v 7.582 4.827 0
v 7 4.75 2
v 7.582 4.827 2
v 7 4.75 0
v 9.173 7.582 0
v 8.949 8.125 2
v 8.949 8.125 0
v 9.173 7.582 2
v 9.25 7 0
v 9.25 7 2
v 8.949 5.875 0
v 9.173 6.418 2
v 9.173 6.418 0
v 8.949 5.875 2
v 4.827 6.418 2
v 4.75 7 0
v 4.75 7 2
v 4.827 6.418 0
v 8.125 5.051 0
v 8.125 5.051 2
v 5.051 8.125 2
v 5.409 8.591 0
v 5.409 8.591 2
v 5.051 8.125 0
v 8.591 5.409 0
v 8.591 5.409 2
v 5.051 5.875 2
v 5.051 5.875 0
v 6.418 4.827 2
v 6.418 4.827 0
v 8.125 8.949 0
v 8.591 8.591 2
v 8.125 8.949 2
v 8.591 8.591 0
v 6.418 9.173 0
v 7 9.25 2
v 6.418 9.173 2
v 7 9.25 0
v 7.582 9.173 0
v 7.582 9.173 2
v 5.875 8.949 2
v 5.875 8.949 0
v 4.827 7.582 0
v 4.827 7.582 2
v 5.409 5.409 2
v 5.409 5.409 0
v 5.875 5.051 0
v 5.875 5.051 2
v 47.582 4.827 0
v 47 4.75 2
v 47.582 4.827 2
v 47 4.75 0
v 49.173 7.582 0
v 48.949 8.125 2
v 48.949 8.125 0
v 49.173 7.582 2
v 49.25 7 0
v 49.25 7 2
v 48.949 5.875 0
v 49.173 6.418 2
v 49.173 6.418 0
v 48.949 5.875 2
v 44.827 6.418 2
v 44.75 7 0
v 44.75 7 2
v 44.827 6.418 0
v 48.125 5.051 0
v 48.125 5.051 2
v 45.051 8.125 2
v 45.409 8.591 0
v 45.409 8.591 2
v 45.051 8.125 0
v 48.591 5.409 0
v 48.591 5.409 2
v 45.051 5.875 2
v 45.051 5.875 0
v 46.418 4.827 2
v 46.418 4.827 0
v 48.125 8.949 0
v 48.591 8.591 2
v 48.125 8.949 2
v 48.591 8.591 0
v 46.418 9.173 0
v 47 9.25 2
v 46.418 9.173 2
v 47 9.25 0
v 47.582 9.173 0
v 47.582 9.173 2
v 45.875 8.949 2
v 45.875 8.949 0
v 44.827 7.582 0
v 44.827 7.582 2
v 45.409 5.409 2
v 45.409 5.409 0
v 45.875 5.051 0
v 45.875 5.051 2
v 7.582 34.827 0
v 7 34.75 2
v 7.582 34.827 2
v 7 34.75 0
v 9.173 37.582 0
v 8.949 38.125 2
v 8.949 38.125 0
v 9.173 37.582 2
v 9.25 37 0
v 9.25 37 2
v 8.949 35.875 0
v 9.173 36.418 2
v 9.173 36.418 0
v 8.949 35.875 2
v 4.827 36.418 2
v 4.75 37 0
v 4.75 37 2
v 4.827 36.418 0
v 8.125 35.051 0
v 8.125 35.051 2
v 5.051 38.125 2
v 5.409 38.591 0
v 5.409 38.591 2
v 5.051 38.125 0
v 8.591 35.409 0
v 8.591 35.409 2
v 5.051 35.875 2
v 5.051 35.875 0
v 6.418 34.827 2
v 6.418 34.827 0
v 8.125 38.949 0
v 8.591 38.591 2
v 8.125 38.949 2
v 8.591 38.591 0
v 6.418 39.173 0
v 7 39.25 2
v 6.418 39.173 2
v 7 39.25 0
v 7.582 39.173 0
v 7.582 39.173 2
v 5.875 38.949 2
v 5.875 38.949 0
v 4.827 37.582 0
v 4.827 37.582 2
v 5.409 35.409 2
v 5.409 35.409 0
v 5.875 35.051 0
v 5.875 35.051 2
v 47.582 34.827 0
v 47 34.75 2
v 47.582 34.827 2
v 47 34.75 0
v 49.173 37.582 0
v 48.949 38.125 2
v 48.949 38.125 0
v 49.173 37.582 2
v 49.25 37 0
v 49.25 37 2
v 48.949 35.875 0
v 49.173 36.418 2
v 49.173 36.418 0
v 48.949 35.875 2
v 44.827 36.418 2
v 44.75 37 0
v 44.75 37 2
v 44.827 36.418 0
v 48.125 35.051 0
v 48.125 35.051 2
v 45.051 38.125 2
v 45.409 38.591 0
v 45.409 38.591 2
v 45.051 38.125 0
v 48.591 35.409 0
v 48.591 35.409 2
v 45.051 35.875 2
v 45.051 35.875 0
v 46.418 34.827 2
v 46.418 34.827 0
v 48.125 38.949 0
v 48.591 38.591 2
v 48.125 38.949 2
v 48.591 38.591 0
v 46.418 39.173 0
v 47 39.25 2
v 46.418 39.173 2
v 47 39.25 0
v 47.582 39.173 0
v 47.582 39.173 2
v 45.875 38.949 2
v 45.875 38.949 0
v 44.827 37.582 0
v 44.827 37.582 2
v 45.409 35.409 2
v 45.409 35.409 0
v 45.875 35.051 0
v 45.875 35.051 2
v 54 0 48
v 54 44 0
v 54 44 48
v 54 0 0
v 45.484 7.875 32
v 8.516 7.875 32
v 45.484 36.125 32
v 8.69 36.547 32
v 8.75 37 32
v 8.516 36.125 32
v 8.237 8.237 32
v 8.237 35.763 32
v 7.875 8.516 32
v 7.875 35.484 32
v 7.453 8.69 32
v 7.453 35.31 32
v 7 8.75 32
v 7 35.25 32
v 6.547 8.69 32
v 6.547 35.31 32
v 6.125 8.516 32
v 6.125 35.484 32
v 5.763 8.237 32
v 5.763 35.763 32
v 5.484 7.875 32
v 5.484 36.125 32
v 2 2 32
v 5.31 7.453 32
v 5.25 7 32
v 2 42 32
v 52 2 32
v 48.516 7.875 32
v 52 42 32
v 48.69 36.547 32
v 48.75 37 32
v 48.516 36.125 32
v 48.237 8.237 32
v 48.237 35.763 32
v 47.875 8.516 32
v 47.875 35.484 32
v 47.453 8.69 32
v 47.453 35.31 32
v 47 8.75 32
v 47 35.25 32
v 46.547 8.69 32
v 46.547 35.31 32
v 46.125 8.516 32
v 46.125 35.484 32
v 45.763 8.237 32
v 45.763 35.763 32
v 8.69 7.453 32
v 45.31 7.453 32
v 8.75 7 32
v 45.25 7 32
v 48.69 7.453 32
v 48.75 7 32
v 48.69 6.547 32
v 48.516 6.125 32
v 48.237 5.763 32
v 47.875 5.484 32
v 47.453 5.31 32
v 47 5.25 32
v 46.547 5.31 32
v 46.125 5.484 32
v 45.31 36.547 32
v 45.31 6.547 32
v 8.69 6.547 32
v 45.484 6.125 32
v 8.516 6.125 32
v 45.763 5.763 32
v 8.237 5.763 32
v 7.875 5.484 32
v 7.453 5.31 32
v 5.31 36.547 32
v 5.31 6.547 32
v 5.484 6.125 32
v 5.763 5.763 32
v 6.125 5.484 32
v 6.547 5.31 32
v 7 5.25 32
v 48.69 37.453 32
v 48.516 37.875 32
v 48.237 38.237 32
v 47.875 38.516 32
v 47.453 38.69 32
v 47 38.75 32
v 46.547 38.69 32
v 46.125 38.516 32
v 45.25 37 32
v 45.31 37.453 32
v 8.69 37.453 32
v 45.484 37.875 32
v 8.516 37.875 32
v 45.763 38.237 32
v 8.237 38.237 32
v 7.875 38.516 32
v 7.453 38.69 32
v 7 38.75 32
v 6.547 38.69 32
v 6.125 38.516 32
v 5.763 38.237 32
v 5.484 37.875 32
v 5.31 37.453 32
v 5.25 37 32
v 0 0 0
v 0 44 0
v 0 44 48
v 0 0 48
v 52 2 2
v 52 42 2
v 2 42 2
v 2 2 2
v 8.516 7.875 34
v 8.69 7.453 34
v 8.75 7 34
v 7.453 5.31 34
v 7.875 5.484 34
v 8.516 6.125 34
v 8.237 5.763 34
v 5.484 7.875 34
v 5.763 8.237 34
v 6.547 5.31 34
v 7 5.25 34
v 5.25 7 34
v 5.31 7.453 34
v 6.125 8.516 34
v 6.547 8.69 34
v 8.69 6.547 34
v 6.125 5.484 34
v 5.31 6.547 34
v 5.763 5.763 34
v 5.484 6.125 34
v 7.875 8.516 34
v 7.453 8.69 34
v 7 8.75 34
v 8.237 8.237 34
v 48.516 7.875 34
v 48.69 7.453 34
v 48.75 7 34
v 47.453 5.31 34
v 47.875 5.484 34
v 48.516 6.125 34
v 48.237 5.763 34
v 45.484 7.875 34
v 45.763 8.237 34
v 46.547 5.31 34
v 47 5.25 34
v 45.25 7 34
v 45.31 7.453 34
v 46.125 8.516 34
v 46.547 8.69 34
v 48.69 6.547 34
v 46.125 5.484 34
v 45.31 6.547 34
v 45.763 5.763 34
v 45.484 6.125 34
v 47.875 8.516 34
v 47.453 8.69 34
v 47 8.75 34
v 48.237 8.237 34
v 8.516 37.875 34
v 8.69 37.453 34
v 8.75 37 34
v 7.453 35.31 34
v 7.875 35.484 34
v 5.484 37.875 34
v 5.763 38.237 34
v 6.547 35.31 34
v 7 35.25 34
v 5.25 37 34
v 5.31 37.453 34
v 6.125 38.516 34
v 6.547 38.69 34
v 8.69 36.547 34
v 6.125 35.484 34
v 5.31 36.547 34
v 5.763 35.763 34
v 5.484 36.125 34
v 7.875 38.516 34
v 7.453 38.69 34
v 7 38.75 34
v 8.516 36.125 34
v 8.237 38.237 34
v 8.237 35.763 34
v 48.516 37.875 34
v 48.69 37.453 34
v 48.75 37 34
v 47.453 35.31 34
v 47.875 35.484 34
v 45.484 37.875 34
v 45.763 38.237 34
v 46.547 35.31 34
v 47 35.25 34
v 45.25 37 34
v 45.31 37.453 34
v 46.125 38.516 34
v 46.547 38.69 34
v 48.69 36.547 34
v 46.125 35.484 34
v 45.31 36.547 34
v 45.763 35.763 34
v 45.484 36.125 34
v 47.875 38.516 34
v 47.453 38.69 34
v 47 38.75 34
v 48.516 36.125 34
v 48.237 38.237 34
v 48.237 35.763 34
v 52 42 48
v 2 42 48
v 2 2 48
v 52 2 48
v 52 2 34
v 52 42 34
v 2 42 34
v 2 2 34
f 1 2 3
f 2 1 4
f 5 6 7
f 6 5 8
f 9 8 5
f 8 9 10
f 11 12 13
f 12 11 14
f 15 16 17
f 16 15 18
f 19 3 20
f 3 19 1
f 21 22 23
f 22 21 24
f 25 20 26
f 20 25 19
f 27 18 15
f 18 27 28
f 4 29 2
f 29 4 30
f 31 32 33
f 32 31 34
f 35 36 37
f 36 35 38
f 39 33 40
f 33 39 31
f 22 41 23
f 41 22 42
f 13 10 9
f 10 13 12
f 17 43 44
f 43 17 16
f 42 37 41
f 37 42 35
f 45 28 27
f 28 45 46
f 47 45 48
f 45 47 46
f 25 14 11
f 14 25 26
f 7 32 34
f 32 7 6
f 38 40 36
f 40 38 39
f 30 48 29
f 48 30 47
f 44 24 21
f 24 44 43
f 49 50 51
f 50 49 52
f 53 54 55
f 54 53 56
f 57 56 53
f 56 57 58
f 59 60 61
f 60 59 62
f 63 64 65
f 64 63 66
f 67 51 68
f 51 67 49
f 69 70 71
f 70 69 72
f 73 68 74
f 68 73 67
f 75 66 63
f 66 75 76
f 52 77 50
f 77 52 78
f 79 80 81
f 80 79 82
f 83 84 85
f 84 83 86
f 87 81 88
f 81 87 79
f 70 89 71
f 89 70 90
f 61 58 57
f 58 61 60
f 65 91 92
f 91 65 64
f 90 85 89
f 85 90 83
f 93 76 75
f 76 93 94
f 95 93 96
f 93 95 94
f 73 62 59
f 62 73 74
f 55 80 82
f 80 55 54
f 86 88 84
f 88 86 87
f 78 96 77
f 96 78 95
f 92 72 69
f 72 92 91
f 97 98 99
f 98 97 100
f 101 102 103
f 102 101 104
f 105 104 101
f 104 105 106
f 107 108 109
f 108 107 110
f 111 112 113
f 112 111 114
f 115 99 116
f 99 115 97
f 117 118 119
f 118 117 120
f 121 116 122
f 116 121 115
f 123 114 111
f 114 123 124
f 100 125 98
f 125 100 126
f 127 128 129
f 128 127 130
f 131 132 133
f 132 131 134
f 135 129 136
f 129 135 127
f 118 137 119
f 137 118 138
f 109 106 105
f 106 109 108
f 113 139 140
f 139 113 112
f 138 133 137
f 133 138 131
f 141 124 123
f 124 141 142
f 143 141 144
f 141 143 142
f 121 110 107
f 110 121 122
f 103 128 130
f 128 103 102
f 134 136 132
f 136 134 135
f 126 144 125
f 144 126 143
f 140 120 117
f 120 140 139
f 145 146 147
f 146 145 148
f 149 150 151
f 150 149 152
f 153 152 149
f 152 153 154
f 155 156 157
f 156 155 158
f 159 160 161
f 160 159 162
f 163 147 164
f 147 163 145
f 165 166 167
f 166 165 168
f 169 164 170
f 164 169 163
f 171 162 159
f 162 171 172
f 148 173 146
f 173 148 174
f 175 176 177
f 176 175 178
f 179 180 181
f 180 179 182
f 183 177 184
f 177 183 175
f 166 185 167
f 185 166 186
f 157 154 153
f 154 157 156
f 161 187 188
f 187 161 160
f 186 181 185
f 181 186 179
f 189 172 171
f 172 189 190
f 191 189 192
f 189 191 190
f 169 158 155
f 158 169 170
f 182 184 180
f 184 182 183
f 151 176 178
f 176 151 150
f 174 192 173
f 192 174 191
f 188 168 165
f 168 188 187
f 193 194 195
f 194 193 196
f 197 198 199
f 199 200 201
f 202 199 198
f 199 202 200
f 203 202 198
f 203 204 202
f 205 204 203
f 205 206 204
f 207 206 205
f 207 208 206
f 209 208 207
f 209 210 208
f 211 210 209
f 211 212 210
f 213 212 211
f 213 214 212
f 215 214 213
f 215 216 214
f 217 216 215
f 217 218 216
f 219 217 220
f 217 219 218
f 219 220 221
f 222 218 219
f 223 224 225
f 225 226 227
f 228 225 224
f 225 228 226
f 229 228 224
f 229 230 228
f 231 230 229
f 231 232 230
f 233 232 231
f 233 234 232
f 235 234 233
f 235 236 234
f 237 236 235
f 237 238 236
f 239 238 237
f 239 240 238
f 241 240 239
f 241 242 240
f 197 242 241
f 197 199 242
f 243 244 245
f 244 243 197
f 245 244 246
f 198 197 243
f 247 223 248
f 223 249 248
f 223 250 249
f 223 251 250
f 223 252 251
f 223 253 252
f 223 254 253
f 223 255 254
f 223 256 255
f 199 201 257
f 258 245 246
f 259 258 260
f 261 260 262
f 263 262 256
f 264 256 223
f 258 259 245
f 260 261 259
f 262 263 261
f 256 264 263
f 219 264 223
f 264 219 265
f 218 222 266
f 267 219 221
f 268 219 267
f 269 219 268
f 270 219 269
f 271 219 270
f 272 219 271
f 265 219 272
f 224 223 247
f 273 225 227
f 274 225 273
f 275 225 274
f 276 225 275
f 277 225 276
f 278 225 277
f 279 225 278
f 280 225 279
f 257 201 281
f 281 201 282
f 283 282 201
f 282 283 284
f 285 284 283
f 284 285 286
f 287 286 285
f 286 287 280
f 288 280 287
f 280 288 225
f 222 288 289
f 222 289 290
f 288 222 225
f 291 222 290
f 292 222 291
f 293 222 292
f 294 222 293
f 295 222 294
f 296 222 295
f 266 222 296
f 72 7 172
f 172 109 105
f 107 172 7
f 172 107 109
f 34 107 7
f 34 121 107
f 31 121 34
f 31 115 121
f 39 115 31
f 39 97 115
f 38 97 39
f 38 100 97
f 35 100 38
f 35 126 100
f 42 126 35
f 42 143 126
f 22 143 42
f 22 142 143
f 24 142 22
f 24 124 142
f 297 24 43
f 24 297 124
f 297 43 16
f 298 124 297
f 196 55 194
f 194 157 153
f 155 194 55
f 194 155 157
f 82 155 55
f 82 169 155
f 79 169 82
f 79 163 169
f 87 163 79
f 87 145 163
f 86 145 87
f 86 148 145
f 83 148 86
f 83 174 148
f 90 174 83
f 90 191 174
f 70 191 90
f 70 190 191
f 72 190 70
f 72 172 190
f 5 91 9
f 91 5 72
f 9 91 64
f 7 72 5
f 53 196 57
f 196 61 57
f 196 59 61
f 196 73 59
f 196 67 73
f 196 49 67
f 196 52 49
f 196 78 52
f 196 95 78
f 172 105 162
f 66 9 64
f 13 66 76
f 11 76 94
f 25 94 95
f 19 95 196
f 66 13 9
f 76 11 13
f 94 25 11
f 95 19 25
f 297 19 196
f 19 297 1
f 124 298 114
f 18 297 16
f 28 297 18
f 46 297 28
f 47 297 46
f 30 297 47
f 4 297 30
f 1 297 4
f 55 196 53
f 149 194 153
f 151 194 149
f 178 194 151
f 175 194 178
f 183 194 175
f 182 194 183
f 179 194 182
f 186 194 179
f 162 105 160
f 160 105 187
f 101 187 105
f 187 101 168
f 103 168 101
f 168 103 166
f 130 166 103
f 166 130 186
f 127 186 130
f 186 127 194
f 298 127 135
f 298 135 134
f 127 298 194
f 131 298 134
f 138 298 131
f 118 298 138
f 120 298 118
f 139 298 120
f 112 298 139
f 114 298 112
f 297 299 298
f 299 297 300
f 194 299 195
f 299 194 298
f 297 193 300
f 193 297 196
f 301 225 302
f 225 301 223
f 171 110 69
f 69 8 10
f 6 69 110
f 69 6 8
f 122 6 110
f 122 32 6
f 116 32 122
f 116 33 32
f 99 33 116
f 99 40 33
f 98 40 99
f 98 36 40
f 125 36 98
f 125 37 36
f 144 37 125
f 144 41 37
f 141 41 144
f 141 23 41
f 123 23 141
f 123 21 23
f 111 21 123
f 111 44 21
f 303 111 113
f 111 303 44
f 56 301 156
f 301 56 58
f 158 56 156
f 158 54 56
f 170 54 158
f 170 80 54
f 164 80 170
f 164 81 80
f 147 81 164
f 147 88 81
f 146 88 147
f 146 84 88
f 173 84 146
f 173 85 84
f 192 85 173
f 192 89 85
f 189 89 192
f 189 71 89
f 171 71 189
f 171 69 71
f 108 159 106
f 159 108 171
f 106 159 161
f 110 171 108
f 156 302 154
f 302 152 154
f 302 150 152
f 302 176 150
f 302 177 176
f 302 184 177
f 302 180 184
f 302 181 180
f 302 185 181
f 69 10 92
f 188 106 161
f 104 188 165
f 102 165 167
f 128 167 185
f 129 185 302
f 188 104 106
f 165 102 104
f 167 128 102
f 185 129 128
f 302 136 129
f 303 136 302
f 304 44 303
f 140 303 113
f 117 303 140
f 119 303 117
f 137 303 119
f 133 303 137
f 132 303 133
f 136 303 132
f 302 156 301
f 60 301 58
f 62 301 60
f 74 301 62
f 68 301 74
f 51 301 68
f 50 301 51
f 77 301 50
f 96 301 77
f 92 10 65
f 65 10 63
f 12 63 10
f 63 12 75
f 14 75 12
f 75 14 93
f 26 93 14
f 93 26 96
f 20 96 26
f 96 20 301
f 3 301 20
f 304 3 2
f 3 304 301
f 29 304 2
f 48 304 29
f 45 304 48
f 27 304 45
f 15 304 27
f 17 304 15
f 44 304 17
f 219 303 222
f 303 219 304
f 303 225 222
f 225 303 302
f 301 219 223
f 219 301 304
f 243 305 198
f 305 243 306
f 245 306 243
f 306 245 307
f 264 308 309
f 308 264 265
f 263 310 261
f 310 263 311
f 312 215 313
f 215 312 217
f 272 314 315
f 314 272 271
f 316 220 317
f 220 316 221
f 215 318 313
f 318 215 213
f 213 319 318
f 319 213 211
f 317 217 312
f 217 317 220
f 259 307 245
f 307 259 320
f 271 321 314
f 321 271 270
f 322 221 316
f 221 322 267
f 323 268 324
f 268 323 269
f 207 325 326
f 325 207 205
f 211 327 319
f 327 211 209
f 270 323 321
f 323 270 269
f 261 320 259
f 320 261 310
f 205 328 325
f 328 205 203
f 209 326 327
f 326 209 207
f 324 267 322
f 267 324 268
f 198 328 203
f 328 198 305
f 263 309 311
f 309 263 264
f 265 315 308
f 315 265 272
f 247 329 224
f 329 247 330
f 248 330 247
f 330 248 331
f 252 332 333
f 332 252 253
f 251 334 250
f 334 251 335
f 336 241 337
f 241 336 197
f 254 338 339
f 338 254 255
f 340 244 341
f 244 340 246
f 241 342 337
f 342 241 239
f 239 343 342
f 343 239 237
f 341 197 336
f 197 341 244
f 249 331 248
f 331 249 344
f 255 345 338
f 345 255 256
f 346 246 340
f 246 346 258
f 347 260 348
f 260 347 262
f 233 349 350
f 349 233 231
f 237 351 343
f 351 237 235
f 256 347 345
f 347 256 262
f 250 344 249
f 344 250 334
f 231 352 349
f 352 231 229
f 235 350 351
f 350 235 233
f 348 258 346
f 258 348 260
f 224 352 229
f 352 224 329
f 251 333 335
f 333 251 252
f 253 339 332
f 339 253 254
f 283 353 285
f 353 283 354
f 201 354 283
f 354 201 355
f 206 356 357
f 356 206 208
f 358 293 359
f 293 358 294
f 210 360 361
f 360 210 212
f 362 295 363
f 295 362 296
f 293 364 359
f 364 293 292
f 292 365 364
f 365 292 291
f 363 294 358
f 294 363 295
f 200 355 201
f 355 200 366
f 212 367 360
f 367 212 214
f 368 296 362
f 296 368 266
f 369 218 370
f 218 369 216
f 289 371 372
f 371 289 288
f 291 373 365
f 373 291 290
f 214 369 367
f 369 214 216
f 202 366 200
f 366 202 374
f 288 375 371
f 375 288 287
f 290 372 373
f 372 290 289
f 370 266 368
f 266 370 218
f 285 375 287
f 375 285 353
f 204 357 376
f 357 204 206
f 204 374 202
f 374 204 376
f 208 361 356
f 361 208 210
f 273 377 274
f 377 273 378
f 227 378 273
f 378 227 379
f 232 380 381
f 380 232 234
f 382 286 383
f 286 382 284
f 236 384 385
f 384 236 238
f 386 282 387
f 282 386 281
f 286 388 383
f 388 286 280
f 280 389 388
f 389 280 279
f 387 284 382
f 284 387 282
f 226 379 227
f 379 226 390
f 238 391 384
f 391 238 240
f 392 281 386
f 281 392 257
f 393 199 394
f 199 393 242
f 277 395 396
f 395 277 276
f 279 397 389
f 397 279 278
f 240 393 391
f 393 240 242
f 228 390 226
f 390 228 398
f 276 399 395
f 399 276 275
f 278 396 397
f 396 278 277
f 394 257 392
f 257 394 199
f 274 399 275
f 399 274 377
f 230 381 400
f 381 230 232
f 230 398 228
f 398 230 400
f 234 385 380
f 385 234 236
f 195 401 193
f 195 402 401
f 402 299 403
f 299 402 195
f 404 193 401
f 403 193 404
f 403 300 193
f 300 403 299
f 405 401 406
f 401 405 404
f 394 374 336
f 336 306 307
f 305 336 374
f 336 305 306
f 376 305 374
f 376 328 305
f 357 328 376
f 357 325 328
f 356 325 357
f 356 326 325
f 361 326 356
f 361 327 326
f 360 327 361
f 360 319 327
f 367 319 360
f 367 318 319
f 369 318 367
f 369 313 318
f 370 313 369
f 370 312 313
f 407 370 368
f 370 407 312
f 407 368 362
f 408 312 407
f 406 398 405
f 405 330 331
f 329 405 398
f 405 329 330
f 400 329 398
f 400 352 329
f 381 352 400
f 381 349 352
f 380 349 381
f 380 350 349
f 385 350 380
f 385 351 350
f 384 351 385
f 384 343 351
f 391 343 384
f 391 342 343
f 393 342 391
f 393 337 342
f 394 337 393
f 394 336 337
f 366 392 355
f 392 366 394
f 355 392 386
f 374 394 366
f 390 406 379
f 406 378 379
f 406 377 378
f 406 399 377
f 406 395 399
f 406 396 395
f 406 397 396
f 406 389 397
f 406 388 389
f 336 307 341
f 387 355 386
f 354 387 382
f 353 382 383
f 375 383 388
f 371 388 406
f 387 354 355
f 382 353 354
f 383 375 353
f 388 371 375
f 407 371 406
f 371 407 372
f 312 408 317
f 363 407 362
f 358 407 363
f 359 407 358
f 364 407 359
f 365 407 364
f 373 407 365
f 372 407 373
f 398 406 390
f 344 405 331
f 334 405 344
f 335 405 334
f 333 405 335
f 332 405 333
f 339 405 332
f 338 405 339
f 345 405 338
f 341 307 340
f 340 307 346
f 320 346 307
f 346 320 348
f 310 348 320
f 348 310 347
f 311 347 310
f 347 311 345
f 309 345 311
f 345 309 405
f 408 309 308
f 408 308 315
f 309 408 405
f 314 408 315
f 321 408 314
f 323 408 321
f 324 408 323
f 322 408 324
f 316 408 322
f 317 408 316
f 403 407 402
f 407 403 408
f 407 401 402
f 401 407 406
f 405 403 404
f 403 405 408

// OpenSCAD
// 3D-Printable Two-Part Enclosure with M3 Heat-Set Inserts
// Cavity: 50 x 40 x 30 mm (internal usable volume)
// Wall thickness: 2.0 mm
// Fastener alignment: ±0.2mm on common vertical axes
// Units: mm

// Overall dimensions
outer_x = 54;
outer_y = 44;
base_height = 32;  // 2mm floor + 30mm cavity
lid_height = 16;

// Internal cavity
cavity_x = 50;
cavity_y = 40;
cavity_depth = 30;

// M3 fastener specifications
m3_clearance_d = 3.5;      // ISO 273 clearance hole
m3_insert_od = 4.5;        // heat-set insert bore diameter
m3_insert_depth = 5.5;     // insert seating depth

// Fastener positions: 7mm inset from corners
fasteners = [
  [7, 7],
  [47, 7],
  [7, 37],
  [47, 37]
];

module base() {
  difference() {
    // Outer solid
    cube([outer_x, outer_y, base_height]);
    
    // Main cavity (2mm floor + walls)
    translate([2, 2, 2])
      cube([cavity_x, cavity_y, cavity_depth]);
    
    // M3 insert bores from bottom
    for (pos = fasteners) {
      translate([pos[0], pos[1], -1])
        cylinder(d=m3_insert_od, h=m3_insert_depth + 1, $fn=24);
    }
  }
}

module lid() {
  difference() {
    // Outer solid
    cube([outer_x, outer_y, lid_height]);
    
    // Central cavity for mass reduction (2mm walls)
    translate([2, 2, 2])
      cube([outer_x - 4, outer_y - 4, lid_height - 2]);
    
    // M3 clearance holes
    for (pos = fasteners) {
      translate([pos[0], pos[1], -1])
        cylinder(d=m3_clearance_d, h=lid_height + 2, $fn=24);
    }
  }
}

// Render both parts in assembled position
base();
translate([0, 0, base_height]) lid();
